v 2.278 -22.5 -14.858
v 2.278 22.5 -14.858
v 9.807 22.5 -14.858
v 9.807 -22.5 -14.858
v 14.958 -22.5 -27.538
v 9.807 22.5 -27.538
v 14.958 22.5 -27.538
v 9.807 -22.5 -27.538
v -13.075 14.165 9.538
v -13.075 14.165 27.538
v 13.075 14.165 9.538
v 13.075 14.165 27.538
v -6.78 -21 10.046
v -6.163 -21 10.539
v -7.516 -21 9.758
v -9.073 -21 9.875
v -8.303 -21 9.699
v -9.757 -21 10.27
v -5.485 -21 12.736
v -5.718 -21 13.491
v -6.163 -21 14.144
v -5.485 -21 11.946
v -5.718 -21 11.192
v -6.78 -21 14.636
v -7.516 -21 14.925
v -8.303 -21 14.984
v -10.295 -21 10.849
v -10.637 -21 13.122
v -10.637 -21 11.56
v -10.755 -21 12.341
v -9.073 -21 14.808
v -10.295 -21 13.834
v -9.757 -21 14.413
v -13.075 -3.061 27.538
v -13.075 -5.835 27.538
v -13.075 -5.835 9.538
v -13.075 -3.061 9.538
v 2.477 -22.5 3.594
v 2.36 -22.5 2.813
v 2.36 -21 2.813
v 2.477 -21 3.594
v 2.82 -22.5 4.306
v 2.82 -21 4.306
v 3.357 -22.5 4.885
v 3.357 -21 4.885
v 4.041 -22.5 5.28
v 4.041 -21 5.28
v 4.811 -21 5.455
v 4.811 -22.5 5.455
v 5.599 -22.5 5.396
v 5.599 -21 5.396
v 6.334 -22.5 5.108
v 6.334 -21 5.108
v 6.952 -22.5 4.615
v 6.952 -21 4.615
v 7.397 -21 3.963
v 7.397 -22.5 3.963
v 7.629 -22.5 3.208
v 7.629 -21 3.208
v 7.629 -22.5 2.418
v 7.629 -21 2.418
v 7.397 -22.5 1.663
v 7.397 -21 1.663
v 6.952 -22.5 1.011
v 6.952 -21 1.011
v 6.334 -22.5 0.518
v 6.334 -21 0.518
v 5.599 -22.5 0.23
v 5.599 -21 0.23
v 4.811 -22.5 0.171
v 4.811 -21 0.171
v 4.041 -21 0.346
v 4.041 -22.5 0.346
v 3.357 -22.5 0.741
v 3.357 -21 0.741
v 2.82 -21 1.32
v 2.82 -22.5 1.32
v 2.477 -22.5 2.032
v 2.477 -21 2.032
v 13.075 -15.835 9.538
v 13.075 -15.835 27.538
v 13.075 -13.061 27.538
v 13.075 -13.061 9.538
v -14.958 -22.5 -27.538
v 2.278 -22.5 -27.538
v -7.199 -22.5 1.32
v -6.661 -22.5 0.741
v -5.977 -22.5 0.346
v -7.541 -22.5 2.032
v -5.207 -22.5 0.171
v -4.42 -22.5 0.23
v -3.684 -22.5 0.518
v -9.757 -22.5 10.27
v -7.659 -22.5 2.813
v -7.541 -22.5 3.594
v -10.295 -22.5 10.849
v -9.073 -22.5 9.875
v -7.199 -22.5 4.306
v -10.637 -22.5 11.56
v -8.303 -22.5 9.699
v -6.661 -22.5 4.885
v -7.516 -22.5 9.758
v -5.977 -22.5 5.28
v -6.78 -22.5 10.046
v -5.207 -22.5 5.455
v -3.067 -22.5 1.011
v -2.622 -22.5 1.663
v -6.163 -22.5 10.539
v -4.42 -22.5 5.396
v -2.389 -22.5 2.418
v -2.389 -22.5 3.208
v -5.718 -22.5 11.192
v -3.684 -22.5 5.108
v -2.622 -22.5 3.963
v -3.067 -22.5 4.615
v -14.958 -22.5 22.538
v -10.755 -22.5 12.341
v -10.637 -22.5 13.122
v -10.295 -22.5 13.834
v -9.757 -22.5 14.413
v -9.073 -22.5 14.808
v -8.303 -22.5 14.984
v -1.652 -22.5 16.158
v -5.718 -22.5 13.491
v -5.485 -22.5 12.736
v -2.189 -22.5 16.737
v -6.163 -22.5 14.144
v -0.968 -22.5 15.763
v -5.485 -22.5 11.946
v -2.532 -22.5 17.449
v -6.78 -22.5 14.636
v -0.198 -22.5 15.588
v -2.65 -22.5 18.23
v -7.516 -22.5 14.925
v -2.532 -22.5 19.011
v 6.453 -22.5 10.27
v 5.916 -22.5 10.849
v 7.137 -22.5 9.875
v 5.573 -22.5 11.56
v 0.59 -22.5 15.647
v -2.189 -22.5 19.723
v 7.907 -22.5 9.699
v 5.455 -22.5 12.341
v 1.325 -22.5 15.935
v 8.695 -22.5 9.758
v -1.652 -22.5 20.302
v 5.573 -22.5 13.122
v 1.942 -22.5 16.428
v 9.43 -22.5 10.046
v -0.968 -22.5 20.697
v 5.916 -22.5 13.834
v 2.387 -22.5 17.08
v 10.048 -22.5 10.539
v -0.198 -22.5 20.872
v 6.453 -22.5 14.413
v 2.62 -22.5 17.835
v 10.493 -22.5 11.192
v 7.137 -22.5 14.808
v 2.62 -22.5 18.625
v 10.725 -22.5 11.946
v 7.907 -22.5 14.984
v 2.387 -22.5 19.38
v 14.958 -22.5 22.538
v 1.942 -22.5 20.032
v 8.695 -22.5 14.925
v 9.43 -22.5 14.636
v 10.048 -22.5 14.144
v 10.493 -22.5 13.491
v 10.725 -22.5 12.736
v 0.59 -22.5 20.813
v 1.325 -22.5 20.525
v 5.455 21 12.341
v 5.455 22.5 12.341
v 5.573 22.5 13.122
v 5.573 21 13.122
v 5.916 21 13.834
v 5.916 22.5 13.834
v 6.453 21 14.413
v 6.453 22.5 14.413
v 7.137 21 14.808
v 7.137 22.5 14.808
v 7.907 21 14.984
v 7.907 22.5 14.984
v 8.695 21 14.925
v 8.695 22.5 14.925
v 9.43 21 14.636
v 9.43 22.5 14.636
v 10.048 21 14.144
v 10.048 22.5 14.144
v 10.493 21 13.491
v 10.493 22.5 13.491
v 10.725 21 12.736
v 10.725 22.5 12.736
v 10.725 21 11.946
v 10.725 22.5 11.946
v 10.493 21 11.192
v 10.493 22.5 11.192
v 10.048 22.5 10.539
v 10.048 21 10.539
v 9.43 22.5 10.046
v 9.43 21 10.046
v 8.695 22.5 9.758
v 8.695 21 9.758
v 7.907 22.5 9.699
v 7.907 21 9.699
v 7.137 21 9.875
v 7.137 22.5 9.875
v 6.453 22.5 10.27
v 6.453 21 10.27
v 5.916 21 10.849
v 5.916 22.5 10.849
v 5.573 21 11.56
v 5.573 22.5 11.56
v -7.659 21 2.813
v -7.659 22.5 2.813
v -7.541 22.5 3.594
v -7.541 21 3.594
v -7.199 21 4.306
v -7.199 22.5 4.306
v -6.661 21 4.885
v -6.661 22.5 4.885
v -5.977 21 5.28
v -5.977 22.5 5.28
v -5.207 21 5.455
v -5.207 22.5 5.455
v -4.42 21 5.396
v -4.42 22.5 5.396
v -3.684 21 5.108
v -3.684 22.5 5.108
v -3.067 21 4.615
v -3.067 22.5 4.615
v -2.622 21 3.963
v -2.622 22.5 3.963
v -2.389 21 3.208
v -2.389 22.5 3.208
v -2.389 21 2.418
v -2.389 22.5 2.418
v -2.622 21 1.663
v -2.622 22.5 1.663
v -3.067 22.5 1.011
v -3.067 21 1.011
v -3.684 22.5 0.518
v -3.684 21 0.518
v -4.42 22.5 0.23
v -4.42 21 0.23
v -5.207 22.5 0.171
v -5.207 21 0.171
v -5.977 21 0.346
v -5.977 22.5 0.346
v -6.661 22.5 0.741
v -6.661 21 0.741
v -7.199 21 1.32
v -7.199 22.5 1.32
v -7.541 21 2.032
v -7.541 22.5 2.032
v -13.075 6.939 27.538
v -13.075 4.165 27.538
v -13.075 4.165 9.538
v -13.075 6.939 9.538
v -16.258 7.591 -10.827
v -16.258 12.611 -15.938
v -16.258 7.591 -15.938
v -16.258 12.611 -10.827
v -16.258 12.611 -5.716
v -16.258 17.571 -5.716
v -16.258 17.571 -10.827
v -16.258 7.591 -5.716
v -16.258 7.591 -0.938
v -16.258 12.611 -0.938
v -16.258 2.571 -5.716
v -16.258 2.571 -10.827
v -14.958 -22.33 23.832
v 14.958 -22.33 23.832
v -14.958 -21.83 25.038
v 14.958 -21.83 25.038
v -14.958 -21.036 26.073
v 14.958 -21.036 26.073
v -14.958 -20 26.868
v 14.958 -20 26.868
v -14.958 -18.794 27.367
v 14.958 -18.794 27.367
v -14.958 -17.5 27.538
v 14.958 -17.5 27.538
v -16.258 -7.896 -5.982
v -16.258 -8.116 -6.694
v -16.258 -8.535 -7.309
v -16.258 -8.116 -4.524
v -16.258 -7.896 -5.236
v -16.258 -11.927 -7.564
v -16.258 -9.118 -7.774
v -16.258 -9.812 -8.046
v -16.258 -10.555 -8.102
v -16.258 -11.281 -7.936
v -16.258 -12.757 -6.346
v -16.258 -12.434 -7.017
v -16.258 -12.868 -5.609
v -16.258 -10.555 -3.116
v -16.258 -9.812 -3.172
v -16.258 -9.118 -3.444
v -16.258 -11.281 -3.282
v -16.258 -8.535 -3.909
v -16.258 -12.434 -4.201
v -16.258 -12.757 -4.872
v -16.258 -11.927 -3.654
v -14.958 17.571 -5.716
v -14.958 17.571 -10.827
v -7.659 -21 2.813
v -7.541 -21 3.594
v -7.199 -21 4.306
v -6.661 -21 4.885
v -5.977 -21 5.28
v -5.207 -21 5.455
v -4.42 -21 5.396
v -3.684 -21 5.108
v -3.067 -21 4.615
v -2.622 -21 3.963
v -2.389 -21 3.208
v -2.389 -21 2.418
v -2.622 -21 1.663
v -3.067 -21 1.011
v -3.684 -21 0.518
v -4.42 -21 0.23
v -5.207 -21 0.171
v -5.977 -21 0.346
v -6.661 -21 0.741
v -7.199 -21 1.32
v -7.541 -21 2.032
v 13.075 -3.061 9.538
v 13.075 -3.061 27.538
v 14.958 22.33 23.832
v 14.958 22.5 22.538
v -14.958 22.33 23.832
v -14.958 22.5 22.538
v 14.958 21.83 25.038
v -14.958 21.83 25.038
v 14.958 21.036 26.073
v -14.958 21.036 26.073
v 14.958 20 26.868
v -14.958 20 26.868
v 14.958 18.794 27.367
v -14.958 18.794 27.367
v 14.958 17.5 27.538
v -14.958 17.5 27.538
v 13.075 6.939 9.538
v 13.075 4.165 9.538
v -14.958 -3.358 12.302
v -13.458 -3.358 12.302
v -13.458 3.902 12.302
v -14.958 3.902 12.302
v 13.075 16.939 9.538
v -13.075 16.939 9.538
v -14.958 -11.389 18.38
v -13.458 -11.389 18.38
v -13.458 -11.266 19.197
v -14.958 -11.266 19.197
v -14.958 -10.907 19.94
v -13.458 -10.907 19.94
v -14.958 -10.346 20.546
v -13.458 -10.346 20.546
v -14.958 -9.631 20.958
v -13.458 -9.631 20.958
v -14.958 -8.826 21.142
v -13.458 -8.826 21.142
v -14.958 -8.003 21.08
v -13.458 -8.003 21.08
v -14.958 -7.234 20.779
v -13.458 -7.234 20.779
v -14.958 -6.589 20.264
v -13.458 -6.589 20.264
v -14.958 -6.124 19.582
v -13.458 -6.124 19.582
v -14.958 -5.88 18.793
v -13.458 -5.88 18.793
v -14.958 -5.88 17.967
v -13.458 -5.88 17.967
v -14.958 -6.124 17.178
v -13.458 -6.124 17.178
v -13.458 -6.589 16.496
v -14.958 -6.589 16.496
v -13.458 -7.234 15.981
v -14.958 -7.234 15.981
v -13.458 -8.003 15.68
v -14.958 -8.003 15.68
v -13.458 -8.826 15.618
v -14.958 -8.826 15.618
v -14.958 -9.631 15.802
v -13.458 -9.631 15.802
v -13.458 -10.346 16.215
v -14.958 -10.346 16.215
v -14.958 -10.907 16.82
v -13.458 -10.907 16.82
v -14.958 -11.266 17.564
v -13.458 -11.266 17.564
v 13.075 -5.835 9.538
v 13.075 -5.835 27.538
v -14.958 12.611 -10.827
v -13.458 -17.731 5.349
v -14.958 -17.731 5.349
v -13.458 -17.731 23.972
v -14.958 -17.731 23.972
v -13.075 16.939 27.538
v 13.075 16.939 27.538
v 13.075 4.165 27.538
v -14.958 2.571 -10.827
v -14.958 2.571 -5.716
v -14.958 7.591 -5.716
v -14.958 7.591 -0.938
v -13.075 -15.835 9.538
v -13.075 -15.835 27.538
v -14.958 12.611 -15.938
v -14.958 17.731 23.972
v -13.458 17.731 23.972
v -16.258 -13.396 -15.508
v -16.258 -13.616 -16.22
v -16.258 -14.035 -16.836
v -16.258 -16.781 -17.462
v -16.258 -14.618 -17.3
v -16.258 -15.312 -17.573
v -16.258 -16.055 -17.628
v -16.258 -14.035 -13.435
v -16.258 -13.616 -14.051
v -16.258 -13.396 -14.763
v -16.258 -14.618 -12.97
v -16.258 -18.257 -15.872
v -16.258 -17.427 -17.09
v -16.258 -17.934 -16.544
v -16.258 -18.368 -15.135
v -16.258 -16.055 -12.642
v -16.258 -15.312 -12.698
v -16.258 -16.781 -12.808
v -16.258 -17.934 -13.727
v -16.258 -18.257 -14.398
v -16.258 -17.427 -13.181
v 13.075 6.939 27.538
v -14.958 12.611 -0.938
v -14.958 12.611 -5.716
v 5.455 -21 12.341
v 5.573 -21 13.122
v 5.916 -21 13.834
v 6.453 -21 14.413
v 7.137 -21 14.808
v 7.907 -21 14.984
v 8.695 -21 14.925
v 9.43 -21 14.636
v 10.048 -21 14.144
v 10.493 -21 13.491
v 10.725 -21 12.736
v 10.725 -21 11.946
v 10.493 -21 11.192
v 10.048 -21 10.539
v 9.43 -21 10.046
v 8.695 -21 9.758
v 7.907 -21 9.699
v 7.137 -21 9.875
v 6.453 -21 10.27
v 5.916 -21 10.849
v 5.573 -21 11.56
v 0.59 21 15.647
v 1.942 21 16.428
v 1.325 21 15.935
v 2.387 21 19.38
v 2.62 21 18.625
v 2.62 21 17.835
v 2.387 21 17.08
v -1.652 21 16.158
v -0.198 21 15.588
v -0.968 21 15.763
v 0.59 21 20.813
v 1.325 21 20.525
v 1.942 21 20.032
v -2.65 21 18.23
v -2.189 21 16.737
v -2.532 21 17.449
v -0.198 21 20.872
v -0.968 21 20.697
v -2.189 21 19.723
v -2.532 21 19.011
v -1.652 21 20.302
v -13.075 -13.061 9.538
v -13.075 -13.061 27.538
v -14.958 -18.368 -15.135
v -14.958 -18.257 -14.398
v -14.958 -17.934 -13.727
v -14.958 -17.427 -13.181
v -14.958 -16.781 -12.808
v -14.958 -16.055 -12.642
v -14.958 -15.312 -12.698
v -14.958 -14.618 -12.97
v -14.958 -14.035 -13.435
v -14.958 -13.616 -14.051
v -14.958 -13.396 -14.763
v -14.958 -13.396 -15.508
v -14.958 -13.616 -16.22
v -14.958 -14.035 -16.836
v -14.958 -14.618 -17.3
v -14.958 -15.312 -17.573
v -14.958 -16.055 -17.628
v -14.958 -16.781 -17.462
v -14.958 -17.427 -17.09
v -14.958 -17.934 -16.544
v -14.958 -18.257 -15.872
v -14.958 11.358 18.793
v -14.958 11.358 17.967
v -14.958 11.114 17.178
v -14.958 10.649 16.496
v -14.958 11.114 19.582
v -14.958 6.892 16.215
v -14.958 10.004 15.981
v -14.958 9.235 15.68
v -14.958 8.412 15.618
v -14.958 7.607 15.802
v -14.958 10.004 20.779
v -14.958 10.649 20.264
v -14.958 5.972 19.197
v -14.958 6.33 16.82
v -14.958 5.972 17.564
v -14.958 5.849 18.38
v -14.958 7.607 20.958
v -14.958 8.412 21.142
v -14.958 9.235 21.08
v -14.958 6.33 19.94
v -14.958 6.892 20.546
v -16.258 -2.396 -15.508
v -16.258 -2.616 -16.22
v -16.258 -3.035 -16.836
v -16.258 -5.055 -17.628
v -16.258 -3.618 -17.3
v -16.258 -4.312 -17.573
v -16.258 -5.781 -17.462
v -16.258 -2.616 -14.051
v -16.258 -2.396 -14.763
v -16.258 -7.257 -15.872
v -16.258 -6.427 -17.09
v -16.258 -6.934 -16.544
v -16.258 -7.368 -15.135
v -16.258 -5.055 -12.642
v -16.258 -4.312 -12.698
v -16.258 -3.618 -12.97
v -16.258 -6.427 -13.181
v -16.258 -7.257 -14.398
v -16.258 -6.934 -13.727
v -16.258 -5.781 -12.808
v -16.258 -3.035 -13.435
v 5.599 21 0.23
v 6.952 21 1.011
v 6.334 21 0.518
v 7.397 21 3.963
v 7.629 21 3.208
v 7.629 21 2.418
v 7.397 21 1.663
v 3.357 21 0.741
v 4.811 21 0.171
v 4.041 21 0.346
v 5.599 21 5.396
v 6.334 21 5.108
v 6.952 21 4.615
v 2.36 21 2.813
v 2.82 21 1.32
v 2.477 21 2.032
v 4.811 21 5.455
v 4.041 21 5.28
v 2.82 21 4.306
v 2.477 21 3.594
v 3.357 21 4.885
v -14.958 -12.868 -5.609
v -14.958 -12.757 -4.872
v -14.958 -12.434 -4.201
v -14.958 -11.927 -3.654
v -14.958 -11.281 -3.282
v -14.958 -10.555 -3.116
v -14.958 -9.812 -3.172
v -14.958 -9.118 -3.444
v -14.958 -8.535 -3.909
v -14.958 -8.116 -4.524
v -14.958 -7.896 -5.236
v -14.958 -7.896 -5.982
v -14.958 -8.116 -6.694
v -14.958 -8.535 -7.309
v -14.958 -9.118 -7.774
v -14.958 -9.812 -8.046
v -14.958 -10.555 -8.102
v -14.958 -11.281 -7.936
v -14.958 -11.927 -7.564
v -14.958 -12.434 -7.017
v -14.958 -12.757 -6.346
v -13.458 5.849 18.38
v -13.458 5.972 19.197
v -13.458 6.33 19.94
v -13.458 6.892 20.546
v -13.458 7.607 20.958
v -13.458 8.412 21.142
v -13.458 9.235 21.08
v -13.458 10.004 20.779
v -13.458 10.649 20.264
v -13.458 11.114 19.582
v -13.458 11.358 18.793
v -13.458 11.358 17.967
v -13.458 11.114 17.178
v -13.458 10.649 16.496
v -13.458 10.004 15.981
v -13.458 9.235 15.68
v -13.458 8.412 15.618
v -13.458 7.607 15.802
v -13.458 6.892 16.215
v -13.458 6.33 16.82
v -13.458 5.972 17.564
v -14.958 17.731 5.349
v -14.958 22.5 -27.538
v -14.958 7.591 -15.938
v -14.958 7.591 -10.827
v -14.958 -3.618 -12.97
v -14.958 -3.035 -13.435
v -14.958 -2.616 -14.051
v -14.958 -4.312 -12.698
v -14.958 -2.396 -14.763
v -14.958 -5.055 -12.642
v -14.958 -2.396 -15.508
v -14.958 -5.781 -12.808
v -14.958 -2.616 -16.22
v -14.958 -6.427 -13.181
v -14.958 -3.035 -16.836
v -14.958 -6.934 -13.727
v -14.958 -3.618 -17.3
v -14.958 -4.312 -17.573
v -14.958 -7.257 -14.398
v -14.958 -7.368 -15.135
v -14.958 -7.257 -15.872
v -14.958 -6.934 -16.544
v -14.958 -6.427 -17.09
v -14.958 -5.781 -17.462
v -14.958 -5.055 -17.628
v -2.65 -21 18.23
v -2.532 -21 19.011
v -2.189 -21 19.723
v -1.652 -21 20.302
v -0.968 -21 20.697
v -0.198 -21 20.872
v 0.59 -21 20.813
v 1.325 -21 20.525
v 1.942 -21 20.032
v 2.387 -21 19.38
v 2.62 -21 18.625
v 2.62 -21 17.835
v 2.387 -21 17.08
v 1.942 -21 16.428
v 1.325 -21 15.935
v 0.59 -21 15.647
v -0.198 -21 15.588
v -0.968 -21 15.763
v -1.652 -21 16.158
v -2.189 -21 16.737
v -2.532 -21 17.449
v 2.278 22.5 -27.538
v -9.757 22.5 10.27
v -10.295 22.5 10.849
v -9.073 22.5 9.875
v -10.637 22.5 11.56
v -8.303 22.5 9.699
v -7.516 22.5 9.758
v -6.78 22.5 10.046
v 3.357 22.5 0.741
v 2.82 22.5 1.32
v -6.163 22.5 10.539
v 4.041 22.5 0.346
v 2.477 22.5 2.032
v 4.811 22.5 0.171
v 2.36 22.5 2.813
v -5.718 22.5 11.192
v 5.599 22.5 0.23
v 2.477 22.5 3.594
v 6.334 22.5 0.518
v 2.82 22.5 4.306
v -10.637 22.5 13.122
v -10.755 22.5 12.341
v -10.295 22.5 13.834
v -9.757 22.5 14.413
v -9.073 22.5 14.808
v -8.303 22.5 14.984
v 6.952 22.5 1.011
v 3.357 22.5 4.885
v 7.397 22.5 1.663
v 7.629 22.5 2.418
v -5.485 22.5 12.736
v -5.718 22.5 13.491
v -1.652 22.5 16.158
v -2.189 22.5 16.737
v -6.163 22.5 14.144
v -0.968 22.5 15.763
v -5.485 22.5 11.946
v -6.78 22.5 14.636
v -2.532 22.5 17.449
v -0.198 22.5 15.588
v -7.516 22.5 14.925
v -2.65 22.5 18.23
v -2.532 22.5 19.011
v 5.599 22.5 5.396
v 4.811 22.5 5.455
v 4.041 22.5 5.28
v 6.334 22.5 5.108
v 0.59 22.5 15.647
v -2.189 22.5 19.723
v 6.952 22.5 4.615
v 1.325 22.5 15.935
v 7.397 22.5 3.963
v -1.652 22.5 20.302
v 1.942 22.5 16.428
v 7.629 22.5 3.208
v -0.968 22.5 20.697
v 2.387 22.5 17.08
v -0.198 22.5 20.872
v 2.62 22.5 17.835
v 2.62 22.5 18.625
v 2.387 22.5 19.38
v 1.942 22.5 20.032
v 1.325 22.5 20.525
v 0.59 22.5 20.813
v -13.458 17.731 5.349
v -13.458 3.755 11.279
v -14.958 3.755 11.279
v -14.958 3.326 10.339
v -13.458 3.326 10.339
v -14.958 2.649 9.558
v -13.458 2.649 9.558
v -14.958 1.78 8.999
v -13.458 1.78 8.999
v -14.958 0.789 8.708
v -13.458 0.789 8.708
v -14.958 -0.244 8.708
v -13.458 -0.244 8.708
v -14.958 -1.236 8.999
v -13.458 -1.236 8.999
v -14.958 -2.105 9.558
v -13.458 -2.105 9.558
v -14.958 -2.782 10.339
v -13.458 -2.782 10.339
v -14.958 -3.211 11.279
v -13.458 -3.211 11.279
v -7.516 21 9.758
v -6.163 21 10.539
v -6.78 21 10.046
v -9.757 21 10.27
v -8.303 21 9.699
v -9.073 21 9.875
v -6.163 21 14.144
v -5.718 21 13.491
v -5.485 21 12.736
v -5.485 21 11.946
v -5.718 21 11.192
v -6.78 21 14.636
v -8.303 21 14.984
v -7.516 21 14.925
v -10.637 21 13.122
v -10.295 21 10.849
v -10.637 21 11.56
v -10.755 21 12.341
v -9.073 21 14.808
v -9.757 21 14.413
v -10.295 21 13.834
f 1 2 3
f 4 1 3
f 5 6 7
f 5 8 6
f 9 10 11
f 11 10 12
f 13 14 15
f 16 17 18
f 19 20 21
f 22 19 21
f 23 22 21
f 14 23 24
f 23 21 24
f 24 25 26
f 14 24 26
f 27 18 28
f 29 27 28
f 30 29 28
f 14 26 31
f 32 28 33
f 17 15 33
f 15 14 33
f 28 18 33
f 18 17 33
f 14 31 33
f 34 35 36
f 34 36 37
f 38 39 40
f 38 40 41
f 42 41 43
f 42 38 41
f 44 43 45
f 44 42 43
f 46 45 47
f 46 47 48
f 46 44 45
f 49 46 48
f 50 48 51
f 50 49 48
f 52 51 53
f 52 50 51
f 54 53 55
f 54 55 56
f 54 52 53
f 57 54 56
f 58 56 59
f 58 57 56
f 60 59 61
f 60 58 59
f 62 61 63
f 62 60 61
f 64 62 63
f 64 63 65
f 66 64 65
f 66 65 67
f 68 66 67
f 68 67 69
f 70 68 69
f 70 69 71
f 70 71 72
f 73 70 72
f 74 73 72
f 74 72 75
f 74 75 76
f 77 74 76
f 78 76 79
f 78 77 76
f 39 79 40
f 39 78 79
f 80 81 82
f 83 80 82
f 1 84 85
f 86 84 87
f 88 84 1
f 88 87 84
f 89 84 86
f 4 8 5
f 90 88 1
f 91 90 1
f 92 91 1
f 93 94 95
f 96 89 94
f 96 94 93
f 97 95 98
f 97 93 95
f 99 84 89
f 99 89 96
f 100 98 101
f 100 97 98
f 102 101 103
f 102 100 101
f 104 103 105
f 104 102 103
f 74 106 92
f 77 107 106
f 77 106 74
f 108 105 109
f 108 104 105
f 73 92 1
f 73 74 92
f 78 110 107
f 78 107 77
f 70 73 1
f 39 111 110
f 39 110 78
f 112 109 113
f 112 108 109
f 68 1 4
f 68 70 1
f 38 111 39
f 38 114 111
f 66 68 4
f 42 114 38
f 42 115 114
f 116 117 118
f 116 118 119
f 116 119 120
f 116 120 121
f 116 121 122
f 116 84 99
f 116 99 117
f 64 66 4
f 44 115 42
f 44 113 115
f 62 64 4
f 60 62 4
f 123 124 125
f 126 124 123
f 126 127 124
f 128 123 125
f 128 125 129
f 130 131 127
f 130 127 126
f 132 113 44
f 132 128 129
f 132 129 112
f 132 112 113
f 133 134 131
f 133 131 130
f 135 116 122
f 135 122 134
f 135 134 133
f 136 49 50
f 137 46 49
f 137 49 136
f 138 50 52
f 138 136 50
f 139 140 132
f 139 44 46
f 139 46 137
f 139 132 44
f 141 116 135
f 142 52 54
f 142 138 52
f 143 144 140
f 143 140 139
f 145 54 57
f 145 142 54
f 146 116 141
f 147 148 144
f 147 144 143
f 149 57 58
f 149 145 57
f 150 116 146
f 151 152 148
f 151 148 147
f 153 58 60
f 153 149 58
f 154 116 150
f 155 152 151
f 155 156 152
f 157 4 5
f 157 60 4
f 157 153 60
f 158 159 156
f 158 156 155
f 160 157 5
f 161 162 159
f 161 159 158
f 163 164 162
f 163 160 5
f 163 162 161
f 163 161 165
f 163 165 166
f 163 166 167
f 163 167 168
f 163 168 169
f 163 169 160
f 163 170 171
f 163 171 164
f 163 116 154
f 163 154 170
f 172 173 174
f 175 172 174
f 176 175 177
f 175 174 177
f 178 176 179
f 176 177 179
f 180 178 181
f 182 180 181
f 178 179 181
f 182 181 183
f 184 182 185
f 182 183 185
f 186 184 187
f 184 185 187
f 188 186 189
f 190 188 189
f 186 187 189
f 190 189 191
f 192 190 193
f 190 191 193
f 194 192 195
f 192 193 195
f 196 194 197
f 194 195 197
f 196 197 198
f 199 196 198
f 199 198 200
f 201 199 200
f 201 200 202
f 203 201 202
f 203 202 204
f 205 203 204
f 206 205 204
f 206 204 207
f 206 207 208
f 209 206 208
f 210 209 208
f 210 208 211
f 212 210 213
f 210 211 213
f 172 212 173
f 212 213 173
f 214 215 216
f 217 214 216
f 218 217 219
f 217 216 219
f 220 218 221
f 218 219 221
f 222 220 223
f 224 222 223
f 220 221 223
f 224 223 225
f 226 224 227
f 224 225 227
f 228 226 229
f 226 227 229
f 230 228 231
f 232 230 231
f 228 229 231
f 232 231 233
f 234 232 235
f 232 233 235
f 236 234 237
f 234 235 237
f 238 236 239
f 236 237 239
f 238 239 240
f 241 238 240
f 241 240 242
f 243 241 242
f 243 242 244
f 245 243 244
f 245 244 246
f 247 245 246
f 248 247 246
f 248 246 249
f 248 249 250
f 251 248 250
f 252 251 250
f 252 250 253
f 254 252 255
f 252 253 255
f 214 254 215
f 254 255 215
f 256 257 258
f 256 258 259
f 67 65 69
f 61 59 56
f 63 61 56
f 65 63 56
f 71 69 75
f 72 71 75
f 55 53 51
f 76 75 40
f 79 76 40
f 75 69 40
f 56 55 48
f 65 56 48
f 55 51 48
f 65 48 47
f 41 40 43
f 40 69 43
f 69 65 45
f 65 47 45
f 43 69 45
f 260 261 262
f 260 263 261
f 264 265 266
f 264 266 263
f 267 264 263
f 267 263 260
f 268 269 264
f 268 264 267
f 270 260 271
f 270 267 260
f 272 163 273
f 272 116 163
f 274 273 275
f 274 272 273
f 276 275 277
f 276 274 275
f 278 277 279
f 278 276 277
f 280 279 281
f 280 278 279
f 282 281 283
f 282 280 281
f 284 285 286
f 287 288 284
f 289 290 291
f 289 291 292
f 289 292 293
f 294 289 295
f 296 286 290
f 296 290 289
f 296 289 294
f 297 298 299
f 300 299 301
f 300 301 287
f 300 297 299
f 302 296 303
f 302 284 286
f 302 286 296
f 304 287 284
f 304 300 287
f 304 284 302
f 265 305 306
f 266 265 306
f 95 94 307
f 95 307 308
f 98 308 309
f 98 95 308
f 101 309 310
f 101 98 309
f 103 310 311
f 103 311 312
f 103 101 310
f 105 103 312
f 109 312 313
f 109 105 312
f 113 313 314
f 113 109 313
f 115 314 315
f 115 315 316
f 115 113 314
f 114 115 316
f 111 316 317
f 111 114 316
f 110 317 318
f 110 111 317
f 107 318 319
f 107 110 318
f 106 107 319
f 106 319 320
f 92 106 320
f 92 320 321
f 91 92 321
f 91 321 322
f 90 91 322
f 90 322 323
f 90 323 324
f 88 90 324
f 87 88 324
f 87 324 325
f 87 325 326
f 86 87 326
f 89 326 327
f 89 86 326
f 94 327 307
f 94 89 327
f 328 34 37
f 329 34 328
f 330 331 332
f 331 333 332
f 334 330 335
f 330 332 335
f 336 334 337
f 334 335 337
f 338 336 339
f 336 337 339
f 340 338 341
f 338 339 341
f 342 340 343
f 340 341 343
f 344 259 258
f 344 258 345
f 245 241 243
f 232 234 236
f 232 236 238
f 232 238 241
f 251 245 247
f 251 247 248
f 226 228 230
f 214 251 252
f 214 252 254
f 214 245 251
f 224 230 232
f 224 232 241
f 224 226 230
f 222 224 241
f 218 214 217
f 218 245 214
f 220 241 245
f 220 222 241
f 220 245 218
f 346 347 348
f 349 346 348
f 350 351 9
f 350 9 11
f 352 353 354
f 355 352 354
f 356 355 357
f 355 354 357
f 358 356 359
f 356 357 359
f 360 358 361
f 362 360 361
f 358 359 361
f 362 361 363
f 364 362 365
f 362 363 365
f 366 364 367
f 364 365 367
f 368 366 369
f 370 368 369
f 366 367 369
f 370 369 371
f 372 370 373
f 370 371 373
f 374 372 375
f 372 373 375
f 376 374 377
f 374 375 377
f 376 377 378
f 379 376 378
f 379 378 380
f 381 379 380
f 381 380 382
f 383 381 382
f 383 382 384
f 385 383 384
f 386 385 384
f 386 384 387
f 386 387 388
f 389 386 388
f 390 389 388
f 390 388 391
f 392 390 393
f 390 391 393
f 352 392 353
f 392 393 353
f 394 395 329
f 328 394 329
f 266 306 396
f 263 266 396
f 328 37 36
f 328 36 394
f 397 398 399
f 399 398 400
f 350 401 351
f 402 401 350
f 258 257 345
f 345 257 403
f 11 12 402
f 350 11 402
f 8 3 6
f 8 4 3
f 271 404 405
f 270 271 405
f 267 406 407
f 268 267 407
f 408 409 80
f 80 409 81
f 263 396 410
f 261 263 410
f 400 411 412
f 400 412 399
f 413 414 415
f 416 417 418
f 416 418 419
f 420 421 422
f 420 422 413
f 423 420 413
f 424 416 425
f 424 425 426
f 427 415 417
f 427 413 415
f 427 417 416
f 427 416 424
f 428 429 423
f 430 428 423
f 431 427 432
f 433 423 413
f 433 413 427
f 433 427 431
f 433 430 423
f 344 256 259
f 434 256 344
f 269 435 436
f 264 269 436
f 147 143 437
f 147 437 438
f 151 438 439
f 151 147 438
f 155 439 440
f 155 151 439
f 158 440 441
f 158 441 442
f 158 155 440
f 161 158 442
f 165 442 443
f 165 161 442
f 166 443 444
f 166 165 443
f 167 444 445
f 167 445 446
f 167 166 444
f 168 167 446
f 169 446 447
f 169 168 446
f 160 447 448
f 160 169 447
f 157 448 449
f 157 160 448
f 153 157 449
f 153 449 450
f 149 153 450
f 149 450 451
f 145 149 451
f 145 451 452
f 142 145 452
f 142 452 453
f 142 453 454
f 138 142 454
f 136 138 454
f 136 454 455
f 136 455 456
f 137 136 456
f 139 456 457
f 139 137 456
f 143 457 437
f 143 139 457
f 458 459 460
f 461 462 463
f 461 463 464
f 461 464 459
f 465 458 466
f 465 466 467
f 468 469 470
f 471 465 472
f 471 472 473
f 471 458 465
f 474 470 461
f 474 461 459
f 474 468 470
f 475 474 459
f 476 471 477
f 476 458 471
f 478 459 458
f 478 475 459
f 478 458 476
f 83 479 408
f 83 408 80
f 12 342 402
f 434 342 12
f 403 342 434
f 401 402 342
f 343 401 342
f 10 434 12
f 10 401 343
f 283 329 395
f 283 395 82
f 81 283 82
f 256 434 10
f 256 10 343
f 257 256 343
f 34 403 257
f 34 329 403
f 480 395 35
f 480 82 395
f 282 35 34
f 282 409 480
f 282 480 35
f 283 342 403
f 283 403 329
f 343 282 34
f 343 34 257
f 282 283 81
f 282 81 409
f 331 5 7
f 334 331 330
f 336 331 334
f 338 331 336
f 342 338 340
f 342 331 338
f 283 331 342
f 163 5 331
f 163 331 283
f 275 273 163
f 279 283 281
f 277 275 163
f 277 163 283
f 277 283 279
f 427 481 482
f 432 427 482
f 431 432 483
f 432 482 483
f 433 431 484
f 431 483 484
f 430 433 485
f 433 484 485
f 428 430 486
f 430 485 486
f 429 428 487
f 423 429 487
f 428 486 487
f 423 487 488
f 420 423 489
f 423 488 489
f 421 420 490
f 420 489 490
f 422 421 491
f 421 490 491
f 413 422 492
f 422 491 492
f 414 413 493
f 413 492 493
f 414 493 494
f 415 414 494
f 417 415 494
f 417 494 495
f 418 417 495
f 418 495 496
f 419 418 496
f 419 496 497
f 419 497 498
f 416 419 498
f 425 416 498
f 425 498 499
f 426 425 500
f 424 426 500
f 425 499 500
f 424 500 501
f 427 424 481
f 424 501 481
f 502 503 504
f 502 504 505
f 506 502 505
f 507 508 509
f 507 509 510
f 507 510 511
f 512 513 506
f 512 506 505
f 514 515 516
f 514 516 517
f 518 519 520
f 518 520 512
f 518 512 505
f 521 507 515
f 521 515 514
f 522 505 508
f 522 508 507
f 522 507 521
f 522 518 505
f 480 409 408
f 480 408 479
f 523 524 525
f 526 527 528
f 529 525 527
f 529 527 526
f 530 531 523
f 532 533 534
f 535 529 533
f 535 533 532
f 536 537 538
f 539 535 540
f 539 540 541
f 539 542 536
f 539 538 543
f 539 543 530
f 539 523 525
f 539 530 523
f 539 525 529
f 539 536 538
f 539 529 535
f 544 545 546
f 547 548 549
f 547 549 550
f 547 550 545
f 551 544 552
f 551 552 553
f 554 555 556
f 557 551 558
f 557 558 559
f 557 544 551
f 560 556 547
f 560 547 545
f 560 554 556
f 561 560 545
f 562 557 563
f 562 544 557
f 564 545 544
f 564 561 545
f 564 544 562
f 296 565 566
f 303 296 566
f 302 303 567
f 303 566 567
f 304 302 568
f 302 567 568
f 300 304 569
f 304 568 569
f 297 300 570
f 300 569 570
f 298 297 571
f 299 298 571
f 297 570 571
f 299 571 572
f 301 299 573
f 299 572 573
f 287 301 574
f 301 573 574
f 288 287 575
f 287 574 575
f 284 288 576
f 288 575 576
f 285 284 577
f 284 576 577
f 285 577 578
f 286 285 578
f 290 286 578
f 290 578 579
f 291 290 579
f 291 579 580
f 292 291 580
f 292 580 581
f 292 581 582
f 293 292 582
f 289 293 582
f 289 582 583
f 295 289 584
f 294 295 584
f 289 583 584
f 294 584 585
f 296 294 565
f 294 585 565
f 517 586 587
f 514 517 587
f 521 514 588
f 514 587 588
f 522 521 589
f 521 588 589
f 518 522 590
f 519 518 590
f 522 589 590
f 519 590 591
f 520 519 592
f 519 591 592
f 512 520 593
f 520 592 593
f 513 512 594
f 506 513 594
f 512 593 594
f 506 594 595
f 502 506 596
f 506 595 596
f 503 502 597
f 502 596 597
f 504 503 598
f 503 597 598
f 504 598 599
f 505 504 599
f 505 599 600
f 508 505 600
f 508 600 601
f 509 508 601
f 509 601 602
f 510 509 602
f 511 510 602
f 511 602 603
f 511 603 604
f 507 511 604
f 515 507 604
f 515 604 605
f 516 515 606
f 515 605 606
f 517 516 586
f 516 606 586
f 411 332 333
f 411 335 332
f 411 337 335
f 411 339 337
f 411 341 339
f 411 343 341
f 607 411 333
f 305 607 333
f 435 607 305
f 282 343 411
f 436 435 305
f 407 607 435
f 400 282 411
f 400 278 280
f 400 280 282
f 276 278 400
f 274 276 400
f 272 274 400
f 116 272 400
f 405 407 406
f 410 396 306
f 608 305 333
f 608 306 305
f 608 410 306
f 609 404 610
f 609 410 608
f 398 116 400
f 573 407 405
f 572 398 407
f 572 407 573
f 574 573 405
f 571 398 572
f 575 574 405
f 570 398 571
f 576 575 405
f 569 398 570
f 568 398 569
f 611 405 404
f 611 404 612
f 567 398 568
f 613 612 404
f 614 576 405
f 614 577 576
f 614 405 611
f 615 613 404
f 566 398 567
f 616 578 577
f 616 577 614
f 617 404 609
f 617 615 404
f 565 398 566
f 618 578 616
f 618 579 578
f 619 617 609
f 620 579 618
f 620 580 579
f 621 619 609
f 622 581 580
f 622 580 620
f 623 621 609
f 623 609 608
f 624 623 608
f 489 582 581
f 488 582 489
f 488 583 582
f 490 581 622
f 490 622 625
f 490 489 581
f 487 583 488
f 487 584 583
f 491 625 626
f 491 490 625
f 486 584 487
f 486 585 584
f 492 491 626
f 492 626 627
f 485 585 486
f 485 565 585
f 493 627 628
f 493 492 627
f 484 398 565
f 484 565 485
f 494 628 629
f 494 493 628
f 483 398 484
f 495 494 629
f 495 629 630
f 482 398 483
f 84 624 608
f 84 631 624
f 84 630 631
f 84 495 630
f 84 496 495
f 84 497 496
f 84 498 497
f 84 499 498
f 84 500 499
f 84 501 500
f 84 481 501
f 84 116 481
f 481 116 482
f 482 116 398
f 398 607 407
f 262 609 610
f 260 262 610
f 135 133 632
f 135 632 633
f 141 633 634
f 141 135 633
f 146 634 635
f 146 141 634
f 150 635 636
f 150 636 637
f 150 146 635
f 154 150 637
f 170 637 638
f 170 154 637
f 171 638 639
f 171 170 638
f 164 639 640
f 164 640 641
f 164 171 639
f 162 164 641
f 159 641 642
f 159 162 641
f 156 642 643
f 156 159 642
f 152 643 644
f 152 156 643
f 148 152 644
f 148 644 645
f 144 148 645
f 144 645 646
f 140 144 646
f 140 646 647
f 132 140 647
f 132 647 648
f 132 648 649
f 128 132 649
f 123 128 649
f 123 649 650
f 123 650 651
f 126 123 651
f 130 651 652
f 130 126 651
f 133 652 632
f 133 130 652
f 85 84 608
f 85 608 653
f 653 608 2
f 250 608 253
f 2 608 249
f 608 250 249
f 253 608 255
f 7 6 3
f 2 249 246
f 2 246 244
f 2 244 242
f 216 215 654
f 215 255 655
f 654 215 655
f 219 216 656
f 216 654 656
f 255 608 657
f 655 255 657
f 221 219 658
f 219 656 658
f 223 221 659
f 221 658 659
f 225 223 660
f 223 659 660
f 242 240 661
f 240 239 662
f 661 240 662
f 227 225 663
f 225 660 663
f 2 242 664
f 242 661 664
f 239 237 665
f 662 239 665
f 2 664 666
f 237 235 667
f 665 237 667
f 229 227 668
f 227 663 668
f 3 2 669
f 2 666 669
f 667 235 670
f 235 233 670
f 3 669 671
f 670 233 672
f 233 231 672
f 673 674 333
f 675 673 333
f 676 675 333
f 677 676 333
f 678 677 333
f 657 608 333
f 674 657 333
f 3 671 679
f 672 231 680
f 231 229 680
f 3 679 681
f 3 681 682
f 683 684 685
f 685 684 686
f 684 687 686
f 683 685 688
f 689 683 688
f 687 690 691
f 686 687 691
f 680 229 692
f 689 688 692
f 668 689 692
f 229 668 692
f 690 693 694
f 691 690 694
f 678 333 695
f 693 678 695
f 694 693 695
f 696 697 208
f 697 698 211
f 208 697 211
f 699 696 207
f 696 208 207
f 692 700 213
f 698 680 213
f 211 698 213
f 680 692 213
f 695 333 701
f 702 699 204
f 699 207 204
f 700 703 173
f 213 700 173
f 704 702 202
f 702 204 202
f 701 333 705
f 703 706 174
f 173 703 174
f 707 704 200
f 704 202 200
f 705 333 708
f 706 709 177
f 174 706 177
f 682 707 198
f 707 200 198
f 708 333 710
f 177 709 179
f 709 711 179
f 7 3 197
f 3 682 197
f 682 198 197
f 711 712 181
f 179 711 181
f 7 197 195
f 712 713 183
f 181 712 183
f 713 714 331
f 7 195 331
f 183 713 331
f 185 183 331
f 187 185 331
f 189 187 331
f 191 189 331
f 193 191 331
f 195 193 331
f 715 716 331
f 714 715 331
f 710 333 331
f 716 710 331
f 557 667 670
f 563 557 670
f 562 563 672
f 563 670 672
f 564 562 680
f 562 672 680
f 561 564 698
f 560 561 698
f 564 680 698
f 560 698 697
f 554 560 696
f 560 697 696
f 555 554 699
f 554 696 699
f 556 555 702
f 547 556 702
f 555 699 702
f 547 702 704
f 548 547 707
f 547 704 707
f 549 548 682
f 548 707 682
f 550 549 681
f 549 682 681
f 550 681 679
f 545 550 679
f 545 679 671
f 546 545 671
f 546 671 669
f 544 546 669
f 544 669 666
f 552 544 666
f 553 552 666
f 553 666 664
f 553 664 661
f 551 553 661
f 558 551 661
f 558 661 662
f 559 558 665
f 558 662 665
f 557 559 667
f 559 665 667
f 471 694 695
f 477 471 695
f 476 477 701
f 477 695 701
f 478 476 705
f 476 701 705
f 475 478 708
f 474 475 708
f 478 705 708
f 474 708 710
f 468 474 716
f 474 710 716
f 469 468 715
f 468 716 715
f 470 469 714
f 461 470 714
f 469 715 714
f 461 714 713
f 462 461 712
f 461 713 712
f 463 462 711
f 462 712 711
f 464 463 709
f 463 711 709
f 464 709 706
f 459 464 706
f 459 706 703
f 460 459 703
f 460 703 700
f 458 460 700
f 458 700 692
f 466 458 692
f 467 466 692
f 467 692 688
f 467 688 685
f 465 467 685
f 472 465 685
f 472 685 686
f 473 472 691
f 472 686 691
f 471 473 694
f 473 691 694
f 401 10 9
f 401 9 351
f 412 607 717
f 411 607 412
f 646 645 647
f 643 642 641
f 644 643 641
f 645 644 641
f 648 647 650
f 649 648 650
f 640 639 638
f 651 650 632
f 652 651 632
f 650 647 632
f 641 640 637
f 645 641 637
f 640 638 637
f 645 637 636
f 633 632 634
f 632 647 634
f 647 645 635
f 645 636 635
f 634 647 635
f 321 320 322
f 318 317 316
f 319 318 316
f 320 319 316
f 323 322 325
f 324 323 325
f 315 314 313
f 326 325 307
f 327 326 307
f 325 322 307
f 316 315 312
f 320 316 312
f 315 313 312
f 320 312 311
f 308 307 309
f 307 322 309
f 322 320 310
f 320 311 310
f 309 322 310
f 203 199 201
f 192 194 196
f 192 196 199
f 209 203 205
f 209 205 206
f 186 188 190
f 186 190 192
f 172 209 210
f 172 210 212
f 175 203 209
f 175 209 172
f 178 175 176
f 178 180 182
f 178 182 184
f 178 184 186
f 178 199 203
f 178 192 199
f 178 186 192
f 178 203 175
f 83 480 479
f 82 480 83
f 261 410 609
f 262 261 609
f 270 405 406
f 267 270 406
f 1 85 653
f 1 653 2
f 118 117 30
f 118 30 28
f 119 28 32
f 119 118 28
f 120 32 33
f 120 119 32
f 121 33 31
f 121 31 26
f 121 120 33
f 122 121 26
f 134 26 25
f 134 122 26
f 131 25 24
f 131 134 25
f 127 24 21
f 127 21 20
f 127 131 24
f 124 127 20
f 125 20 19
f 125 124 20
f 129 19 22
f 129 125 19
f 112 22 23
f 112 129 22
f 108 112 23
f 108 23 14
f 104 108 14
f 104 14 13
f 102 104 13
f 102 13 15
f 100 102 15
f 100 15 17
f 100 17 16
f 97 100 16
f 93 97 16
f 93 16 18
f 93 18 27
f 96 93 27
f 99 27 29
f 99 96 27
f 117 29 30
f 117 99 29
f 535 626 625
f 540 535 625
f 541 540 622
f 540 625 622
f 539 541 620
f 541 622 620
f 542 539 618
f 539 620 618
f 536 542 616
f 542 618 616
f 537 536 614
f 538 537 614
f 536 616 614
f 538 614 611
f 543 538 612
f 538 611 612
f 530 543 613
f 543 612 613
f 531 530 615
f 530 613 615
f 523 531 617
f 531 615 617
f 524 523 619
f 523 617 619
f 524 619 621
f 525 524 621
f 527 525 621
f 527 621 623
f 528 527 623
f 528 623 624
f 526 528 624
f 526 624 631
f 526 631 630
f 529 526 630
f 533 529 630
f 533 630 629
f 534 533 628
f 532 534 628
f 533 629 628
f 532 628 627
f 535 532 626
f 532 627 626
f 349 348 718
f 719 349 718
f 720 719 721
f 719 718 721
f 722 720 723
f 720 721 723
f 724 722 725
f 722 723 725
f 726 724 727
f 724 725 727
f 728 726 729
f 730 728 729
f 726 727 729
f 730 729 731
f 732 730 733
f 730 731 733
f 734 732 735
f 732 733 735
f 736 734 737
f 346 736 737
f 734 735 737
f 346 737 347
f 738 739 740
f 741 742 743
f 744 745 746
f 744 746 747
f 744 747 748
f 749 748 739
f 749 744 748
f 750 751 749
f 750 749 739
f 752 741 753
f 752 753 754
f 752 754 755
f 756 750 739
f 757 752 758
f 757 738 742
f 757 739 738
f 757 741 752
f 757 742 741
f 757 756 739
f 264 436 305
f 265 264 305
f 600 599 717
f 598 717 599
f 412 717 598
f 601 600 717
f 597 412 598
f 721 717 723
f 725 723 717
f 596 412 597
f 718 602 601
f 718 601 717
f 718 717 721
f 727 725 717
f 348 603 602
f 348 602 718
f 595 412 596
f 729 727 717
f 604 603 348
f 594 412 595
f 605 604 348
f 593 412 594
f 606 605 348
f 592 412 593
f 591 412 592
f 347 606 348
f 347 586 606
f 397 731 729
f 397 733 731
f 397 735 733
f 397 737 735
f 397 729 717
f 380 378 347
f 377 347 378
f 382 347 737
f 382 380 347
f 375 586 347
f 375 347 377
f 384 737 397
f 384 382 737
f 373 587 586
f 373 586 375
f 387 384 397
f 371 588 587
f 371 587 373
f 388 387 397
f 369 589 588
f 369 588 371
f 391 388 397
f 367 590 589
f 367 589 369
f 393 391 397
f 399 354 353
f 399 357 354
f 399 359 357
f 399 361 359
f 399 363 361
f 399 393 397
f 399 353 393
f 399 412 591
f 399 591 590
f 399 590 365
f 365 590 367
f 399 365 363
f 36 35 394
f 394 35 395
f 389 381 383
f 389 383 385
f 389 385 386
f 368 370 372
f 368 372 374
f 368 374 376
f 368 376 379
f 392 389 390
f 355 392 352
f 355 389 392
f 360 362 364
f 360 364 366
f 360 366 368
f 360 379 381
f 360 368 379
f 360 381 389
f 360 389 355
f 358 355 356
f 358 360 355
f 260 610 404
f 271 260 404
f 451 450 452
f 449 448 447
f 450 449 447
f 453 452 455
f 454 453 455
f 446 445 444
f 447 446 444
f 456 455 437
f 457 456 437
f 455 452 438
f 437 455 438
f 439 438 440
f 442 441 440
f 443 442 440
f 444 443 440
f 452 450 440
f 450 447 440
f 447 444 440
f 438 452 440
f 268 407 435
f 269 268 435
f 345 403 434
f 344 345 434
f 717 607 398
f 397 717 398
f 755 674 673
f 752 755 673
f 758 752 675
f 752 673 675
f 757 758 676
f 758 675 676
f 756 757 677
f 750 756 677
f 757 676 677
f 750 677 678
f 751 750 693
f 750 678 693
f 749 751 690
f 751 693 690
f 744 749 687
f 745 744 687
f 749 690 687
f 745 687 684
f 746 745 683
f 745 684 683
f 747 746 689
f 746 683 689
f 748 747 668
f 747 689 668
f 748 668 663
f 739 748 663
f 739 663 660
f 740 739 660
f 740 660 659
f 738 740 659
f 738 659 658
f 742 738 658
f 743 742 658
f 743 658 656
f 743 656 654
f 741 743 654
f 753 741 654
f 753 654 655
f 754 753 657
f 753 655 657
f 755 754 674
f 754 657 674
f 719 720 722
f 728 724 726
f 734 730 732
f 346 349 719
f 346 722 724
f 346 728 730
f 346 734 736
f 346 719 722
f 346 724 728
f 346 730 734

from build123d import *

# Parameters (mm, degrees)
F1_DEPTH  = 22.5
F3_W      = 26.150945574
F3_H      = 2.773584798
F4_DEPTH  = 18
F7_R      = 5
F6_W      = 35.4622639716
F6_H      = 18.6226405203
F8_DEPTH  = 1.5
F10_R     = 2.7697383404
F11_DEPTH = 1.5
F14_R     = 2.5
F15_DEPTH = 1.3
F17_R     = 2.6497529256
F18_DEPTH = 1.5


# Not quite as in the source:
# - a pattern or mirror of a feature is missing from the dataset's text; its kind, count and spacing are read off the source's solid


with BuildPart() as f1:
    # F0 (on Front) → F1 (new body, symmetric)
    with BuildSketch(Plane.XZ):
        Polygon((9.8066031933, -27.5377351791), (14.9575471878, -27.5377351791), (14.9575471878, 27.5377351791), (-14.9575471878, 27.5377351791), (-14.9575471878, -27.5377351791), (2.2783020977, -27.5377351791), (2.2783020977, -14.8584917188), (9.8066031933, -14.8584917188), align=None)
    extrude(amount=F1_DEPTH, both=True)

    # F3 (on offset) → F4 (cut)
    with BuildSketch(Plane.XY.offset(27.5377351791)):
        with Locations((0, 15.5518874526)):
            Rectangle(F3_W, F3_H)
        with Locations((0, 5.5518874526)):
            Rectangle(F3_W, F3_H)
        with Locations((0, -4.4481125474)):
            Rectangle(F3_W, F3_H)
        with Locations((0, -14.4481125474)):
            Rectangle(F3_W, F3_H)
    extrude(amount=-F4_DEPTH, mode=Mode.SUBTRACT)

    # F7
    f7_edges = [f1.edges().sort_by_distance(p)[0] for p in [
        (0, -22.5, 27.537735),
        (0, 22.5, 27.537735),
    ]]
    fillet(f7_edges, radius=F7_R)

    # F6 (on offset) → F8 (cut)
    with BuildSketch(Plane(origin=(-14.9575471878, 0, 0), x_dir=(0, -1, 0), z_dir=(-1, 0, 0))):
        with Locations((0, 14.6603807807)):
            Rectangle(F6_W, F6_H)
    extrude(amount=-F8_DEPTH, mode=Mode.SUBTRACT)

    # F10 (on offset) → F11 (join)
    with BuildSketch(Plane(origin=(-13.4575471878, 0, 0), x_dir=(0, -1, 0), z_dir=(-1, 0, 0))):
        with Locations((-8.6189499125, 18.3801390231)):
            Circle(F10_R)
        with Locations((8.6189499125, 18.3801390231)):
            Circle(F10_R)
        with BuildLine():
            Line((3.3579913629, 12.3015097342), (-3.90234219, 12.3015097342))
            ThreePointArc((-3.90234219, 12.3015097342), (-0.2721754136, 8.6713429578), (3.3579913629, 12.3015097342))
        make_face()
    extrude(amount=F11_DEPTH)

    # F13 (on offset) + F14 (on offset) → F15 (join)
    with BuildSketch(Plane(origin=(-14.9575471878, 0, 0), x_dir=(0, -1, 0), z_dir=(-1, 0, 0))):
        Polygon((-12.6108881086, -15.9375003353), (-7.5907266326, -15.9375003353), (-7.5907266326, -10.8266131394), (-2.5705651566, -10.8266131394), (-2.5705651566, -5.7157259434), (-7.5907266326, -5.7157259434), (-7.5907266326, -0.9375003353), (-12.6108881086, -0.9375003353), (-12.6108881086, -5.7157259434), (-17.5705651566, -5.7157259434), (-17.5705651566, -10.8266131394), (-12.6108881086, -10.8266131394), align=None)
    with BuildSketch(Plane(origin=(-14.9575471878, 0, 0), x_dir=(0, -1, 0), z_dir=(-1, 0, 0))):
        with Locations((10.3680184111, -5.60903208)):
            Circle(F14_R)
        with Locations((4.8680184111, -15.1353115216)):
            Circle(F14_R)
        with Locations((15.8680184111, -15.1353115216)):
            Circle(F14_R)
    extrude(amount=F15_DEPTH)

    # F17 (on offset) → F18 (cut)
    with BuildSketch(Plane(origin=(0, 22.5, 0), x_dir=(-1, 0, 0), z_dir=(0, 1, 0))):
        with Locations((0, 18.2300075523)):
            Circle(F17_R)
        with Locations((8.105232894, 12.3412111554)):
            Circle(F17_R)
        with Locations((5.0093094152, 2.8129384324)):
            Circle(F17_R)
        with Locations((-5.0093094152, 2.8129384324)):
            Circle(F17_R)
        with Locations((-8.105232894, 12.3412111554)):
            Circle(F17_R)
    f18 = extrude(amount=-F18_DEPTH, mode=Mode.SUBTRACT)

    # F18_copies: F18 across plane
    add(f18.mirror(Plane(origin=(0, 0, 0), x_dir=(0, 0, -1), z_dir=(0, -1, 0))), mode=Mode.SUBTRACT)


solid = f1.part
